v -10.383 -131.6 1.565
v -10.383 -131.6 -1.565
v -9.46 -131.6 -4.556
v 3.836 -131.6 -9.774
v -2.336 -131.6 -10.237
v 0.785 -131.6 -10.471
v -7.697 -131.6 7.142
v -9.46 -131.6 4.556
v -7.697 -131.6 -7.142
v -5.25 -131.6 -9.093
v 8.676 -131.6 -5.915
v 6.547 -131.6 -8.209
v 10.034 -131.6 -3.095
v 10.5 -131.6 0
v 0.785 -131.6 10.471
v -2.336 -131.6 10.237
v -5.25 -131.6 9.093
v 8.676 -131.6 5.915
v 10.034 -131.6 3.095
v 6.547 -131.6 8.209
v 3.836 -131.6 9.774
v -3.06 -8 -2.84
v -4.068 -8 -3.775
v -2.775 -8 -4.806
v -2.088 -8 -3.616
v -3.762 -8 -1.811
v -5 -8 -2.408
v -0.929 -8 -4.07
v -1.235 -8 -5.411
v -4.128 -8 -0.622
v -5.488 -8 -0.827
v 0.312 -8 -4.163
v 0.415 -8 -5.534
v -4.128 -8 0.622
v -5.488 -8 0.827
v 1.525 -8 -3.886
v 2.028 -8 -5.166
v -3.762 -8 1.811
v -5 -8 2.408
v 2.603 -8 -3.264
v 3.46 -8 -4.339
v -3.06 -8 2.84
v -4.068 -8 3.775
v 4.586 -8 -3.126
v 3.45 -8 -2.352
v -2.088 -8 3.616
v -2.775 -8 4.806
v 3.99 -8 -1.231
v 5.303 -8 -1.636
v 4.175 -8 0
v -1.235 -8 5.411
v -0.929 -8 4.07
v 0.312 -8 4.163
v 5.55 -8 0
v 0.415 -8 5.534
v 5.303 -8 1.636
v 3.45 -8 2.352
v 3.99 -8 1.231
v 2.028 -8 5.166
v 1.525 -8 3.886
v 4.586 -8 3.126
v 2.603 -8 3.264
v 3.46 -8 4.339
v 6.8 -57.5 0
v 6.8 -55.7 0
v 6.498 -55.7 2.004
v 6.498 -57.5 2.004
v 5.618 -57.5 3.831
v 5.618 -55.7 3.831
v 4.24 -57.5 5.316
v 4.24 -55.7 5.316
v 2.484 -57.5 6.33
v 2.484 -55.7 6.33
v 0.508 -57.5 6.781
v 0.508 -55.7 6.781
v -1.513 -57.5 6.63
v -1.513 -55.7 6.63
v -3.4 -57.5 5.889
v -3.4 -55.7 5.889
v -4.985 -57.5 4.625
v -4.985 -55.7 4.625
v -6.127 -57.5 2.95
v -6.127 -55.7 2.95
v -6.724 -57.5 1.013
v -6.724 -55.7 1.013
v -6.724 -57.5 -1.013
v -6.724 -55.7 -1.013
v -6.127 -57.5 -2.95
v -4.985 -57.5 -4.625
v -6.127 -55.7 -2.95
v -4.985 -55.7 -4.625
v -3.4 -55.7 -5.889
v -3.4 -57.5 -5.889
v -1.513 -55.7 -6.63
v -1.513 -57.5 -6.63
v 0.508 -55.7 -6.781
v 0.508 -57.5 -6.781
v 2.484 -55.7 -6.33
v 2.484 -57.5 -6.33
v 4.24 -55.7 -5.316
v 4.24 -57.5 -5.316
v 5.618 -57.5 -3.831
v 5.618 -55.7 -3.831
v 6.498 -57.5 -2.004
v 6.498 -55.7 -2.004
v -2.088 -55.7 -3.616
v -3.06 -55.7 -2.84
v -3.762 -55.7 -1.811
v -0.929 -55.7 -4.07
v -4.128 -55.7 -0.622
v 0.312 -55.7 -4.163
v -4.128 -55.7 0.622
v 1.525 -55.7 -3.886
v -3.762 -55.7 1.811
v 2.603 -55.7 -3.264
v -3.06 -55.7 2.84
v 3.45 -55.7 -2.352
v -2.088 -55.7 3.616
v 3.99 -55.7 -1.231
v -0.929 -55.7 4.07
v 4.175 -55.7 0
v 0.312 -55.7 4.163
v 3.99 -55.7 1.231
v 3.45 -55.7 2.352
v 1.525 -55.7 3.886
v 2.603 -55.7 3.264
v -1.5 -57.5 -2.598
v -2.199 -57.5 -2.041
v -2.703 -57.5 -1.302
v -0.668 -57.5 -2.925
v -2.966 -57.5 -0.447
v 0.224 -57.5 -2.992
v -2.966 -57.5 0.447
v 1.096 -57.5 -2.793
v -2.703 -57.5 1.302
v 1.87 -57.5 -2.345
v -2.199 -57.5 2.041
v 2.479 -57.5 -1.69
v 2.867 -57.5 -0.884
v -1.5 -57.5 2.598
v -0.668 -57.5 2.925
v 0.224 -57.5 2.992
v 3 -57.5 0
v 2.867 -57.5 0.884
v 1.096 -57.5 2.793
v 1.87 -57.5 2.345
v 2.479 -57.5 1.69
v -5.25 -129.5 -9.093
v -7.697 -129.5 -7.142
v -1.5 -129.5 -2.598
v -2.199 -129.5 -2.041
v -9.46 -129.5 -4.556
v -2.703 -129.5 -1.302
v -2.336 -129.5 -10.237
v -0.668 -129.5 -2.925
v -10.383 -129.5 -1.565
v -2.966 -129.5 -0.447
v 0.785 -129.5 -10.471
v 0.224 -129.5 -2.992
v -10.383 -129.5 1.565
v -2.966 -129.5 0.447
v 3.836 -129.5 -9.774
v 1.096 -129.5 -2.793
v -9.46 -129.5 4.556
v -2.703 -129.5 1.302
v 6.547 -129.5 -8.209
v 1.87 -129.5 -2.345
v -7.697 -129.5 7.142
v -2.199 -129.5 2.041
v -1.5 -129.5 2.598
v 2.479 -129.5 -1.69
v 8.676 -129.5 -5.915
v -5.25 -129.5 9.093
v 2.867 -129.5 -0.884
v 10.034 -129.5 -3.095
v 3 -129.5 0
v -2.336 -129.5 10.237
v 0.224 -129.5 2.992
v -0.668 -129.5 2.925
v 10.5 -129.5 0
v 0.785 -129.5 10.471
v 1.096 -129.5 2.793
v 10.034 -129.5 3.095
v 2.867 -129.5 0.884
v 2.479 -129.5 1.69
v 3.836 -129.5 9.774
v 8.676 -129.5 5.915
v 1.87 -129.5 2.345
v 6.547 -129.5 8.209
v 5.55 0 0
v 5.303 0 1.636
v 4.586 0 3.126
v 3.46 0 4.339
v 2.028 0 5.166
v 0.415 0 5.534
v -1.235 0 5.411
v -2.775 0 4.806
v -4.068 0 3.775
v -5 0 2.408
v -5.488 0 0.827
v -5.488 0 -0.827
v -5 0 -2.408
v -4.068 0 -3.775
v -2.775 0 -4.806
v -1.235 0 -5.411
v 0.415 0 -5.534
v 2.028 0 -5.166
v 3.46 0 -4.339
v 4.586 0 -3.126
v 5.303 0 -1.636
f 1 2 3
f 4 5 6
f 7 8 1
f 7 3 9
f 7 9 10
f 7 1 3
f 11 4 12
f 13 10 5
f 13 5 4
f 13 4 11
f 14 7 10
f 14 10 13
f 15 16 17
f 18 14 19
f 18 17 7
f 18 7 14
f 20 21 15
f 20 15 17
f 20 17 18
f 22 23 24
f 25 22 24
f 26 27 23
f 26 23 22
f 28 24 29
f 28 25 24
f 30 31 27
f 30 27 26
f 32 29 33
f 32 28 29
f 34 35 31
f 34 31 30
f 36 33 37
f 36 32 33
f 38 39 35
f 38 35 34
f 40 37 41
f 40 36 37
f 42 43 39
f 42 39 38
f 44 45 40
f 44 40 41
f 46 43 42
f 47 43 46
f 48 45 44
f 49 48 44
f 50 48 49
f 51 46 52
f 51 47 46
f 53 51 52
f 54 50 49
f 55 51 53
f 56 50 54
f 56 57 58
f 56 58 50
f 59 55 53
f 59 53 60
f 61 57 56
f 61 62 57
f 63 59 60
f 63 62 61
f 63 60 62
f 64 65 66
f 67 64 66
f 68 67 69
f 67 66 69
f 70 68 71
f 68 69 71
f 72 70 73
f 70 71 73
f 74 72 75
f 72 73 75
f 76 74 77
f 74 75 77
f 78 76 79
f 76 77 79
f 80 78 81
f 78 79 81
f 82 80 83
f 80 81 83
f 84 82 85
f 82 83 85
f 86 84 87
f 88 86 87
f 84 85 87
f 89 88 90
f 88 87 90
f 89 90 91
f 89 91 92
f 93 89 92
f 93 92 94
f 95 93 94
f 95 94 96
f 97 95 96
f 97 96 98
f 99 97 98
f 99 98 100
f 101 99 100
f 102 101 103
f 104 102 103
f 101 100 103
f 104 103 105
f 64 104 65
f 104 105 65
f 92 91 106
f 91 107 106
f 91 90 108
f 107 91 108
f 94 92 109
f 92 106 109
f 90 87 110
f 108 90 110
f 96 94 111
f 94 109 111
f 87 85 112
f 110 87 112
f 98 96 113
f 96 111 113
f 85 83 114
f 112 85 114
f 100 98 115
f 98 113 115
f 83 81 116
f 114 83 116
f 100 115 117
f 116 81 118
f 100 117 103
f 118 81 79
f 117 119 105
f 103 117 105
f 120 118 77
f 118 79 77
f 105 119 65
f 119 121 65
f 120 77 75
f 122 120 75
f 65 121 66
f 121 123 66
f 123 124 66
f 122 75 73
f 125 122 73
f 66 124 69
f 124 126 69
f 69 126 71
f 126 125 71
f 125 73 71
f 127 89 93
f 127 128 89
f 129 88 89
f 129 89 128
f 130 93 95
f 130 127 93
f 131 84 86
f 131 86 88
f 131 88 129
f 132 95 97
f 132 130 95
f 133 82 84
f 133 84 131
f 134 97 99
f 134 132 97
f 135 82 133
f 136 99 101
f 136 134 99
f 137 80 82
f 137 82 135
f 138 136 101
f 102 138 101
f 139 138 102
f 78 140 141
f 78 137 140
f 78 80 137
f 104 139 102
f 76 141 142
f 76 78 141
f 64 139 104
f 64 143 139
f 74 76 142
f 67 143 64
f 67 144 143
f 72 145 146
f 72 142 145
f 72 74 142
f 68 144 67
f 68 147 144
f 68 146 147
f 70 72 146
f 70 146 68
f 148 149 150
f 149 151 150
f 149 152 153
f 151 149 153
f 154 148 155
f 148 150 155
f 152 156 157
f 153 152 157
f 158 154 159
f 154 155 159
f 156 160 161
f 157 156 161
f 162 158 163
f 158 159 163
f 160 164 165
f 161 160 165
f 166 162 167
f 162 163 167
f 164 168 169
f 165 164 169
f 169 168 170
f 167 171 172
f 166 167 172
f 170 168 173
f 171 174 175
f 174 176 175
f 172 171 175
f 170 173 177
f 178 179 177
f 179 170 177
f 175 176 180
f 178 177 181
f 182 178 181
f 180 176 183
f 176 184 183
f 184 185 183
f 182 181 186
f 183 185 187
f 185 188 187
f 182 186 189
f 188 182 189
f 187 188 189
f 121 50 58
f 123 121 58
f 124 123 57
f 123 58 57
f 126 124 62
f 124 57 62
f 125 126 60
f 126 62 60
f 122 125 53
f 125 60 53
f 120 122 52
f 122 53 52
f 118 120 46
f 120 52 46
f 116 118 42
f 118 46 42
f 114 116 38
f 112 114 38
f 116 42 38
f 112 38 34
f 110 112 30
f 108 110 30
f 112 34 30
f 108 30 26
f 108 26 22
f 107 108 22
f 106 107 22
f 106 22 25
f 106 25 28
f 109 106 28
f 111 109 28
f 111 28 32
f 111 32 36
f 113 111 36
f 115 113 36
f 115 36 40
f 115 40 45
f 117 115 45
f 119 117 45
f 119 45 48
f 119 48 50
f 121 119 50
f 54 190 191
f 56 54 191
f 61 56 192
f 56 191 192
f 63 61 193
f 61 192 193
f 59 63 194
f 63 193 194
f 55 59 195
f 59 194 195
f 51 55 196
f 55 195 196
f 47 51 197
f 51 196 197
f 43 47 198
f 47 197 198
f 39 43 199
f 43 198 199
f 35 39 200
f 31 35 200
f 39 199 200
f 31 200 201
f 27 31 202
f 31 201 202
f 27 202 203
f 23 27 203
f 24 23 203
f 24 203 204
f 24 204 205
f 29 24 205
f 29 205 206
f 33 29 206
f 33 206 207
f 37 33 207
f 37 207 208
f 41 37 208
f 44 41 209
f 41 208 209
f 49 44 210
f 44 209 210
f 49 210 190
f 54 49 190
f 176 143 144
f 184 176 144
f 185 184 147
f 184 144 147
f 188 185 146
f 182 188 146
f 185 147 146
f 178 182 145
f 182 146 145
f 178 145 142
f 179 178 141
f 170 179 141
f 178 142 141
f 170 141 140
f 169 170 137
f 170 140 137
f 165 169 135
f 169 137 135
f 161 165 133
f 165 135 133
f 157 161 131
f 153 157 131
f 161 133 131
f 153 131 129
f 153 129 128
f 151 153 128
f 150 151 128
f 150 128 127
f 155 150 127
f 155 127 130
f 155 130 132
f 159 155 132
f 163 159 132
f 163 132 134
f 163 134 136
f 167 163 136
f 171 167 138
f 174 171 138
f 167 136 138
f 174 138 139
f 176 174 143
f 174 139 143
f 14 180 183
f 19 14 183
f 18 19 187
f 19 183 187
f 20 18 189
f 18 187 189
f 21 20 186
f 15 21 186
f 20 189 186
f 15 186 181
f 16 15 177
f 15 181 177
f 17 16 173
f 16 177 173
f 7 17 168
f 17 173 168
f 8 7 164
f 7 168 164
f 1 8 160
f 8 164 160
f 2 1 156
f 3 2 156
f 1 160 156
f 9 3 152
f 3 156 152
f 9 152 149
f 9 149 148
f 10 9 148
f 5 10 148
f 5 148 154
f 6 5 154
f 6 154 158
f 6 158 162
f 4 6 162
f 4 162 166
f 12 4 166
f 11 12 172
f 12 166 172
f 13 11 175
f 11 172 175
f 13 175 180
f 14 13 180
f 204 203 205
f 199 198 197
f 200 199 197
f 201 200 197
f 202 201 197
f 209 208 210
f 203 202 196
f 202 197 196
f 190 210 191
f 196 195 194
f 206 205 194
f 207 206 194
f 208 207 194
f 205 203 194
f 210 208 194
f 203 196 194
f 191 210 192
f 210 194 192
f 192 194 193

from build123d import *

# Parameters (mm, degrees)
F0_R     = 5.55
F1_DEPTH = 8
F2_R     = 4.175
F3_DEPTH = 55.7
F4_R     = 6.8
F5_DEPTH = 1.8
F6_R     = 3
F7_DEPTH = 72
F8_R     = 10.5
F9_DEPTH = 2.1


with BuildPart() as f1:
    # F0 (on Front) → F1 (new body)
    with BuildSketch(Plane.XZ):
        Circle(F0_R)
    extrude(amount=F1_DEPTH)

    # F2 (on Front) → F3 (join)
    with BuildSketch(Plane.XZ):
        Circle(F2_R)
    extrude(amount=F3_DEPTH)

    # F4 (on face) → F5 (join)
    with BuildSketch(Plane.XZ.offset(55.7)):
        Circle(F4_R)
    extrude(amount=F5_DEPTH)

    # F6 (on face) → F7 (join)
    with BuildSketch(Plane.XZ.offset(57.5)):
        Circle(F6_R)
    extrude(amount=F7_DEPTH)

    # F8 (on face) → F9 (join)
    with BuildSketch(Plane.XZ.offset(129.5)):
        Circle(F8_R)
    extrude(amount=F9_DEPTH)


solid = f1.part
